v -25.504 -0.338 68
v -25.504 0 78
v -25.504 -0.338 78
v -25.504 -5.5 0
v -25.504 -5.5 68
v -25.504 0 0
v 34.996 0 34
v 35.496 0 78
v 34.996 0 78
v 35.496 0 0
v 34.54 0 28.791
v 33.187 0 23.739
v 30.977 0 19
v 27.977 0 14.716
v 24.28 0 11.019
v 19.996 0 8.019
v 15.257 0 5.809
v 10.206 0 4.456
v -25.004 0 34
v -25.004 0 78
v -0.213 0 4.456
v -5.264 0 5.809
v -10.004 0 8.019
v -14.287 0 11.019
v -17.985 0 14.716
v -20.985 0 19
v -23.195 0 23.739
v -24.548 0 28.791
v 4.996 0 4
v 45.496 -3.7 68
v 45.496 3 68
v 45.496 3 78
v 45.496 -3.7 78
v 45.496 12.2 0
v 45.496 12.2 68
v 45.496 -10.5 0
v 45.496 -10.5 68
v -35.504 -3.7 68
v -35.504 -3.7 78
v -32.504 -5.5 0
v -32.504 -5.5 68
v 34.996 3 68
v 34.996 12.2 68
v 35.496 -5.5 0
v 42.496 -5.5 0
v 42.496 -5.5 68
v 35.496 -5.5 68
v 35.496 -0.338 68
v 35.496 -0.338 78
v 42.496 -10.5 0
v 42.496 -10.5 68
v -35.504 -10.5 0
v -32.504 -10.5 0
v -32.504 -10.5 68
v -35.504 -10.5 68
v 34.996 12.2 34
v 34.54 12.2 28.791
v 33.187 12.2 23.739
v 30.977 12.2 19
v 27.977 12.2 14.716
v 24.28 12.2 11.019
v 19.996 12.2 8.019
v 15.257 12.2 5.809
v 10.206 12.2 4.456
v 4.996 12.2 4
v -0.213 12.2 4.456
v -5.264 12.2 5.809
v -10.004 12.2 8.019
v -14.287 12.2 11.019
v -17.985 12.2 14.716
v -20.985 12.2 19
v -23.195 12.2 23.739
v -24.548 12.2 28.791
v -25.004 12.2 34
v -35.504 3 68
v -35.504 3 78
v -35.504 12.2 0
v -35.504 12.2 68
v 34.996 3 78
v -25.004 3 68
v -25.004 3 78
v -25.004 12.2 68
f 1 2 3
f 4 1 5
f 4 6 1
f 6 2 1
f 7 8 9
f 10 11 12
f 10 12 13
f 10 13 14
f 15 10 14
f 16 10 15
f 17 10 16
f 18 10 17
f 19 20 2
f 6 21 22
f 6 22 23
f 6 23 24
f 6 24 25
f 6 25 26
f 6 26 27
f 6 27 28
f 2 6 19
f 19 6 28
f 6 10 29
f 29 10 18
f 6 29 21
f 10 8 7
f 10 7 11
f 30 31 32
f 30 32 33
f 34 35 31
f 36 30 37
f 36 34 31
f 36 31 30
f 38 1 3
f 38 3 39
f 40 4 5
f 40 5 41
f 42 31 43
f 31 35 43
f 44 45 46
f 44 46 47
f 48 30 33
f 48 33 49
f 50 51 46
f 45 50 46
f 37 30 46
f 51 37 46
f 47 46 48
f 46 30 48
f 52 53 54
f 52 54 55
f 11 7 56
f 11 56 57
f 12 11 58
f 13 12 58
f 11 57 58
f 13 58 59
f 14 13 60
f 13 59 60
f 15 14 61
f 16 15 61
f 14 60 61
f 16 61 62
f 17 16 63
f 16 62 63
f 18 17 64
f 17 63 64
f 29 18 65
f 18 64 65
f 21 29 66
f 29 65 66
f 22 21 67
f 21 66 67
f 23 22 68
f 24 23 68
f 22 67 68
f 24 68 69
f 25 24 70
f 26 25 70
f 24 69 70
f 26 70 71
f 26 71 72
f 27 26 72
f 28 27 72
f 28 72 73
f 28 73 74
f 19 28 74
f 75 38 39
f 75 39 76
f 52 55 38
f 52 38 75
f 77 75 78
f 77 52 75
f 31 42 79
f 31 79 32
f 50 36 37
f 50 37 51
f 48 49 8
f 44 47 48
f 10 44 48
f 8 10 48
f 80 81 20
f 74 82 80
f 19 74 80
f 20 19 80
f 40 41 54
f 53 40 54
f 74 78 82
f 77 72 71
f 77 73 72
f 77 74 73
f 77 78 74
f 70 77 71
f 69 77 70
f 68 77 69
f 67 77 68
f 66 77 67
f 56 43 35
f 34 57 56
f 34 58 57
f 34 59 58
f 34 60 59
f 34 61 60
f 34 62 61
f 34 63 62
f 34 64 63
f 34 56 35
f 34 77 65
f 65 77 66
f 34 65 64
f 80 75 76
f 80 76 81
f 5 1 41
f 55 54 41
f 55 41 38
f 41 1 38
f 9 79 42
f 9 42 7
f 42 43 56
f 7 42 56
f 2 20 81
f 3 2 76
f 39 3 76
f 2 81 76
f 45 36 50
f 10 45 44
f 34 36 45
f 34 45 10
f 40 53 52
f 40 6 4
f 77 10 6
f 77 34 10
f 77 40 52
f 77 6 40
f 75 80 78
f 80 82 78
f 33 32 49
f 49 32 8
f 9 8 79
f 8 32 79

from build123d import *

# Parameters (mm, degrees)
BOSS_EXTRU_1_DEPTH      = 68
ENL_V_MAT_EXTRU_1_DEPTH = 30
BOSS_EXTRU_2_DEPTH      = 10


with BuildPart() as part:
    # Esquisse1 → Boss.-Extru.1 (new body)
    with BuildSketch(Plane.XY):
        Polygon((-32.503867199, -5.5), (-32.503867199, -10.5), (-35.503867199, -10.5), (-35.503867199, 12.2), (45.496132801, 12.2), (45.496132801, -10.5), (42.496132801, -10.5), (42.496132801, -5.5), (35.496132801, -5.5), (35.496132801, 0), (-25.503867199, 0), (-25.503867199, -5.5), align=None)
    extrude(amount=BOSS_EXTRU_1_DEPTH)

    # Esquisse2 → Enlèv. mat.-Extru.1 (cut)
    with BuildSketch(Plane(origin=(0, 12.2, 0), x_dir=(1, 0, 0), z_dir=(0, 1, 0))):
        with BuildLine():
            Line((-25.003867199, -34), (-25.003867199, -68))
            Line((-25.003867199, -68), (34.996132801, -68))
            Line((34.996132801, -68), (34.996132801, -34))
            ThreePointArc((34.996132801, -34), (4.996132801, -4), (-25.003867199, -34))
        make_face()
    extrude(amount=-ENL_V_MAT_EXTRU_1_DEPTH, mode=Mode.SUBTRACT)

    # Esquisse3 → Boss.-Extru.2 (add)
    with BuildSketch(Plane.XY.offset(68)):
        Polygon((-35.503867199, -3.7), (-35.503867199, 3), (-25.003867199, 3), (-25.003867199, 0), (-25.503867199, 0), (-25.503867199, -0.338080905), align=None)
        Polygon((35.496132801, -0.338080905), (35.496132801, 0), (34.996132801, 0), (34.996132801, 3), (45.496132801, 3), (45.496132801, -3.7), align=None)
    extrude(amount=BOSS_EXTRU_2_DEPTH)


solid = part.part
